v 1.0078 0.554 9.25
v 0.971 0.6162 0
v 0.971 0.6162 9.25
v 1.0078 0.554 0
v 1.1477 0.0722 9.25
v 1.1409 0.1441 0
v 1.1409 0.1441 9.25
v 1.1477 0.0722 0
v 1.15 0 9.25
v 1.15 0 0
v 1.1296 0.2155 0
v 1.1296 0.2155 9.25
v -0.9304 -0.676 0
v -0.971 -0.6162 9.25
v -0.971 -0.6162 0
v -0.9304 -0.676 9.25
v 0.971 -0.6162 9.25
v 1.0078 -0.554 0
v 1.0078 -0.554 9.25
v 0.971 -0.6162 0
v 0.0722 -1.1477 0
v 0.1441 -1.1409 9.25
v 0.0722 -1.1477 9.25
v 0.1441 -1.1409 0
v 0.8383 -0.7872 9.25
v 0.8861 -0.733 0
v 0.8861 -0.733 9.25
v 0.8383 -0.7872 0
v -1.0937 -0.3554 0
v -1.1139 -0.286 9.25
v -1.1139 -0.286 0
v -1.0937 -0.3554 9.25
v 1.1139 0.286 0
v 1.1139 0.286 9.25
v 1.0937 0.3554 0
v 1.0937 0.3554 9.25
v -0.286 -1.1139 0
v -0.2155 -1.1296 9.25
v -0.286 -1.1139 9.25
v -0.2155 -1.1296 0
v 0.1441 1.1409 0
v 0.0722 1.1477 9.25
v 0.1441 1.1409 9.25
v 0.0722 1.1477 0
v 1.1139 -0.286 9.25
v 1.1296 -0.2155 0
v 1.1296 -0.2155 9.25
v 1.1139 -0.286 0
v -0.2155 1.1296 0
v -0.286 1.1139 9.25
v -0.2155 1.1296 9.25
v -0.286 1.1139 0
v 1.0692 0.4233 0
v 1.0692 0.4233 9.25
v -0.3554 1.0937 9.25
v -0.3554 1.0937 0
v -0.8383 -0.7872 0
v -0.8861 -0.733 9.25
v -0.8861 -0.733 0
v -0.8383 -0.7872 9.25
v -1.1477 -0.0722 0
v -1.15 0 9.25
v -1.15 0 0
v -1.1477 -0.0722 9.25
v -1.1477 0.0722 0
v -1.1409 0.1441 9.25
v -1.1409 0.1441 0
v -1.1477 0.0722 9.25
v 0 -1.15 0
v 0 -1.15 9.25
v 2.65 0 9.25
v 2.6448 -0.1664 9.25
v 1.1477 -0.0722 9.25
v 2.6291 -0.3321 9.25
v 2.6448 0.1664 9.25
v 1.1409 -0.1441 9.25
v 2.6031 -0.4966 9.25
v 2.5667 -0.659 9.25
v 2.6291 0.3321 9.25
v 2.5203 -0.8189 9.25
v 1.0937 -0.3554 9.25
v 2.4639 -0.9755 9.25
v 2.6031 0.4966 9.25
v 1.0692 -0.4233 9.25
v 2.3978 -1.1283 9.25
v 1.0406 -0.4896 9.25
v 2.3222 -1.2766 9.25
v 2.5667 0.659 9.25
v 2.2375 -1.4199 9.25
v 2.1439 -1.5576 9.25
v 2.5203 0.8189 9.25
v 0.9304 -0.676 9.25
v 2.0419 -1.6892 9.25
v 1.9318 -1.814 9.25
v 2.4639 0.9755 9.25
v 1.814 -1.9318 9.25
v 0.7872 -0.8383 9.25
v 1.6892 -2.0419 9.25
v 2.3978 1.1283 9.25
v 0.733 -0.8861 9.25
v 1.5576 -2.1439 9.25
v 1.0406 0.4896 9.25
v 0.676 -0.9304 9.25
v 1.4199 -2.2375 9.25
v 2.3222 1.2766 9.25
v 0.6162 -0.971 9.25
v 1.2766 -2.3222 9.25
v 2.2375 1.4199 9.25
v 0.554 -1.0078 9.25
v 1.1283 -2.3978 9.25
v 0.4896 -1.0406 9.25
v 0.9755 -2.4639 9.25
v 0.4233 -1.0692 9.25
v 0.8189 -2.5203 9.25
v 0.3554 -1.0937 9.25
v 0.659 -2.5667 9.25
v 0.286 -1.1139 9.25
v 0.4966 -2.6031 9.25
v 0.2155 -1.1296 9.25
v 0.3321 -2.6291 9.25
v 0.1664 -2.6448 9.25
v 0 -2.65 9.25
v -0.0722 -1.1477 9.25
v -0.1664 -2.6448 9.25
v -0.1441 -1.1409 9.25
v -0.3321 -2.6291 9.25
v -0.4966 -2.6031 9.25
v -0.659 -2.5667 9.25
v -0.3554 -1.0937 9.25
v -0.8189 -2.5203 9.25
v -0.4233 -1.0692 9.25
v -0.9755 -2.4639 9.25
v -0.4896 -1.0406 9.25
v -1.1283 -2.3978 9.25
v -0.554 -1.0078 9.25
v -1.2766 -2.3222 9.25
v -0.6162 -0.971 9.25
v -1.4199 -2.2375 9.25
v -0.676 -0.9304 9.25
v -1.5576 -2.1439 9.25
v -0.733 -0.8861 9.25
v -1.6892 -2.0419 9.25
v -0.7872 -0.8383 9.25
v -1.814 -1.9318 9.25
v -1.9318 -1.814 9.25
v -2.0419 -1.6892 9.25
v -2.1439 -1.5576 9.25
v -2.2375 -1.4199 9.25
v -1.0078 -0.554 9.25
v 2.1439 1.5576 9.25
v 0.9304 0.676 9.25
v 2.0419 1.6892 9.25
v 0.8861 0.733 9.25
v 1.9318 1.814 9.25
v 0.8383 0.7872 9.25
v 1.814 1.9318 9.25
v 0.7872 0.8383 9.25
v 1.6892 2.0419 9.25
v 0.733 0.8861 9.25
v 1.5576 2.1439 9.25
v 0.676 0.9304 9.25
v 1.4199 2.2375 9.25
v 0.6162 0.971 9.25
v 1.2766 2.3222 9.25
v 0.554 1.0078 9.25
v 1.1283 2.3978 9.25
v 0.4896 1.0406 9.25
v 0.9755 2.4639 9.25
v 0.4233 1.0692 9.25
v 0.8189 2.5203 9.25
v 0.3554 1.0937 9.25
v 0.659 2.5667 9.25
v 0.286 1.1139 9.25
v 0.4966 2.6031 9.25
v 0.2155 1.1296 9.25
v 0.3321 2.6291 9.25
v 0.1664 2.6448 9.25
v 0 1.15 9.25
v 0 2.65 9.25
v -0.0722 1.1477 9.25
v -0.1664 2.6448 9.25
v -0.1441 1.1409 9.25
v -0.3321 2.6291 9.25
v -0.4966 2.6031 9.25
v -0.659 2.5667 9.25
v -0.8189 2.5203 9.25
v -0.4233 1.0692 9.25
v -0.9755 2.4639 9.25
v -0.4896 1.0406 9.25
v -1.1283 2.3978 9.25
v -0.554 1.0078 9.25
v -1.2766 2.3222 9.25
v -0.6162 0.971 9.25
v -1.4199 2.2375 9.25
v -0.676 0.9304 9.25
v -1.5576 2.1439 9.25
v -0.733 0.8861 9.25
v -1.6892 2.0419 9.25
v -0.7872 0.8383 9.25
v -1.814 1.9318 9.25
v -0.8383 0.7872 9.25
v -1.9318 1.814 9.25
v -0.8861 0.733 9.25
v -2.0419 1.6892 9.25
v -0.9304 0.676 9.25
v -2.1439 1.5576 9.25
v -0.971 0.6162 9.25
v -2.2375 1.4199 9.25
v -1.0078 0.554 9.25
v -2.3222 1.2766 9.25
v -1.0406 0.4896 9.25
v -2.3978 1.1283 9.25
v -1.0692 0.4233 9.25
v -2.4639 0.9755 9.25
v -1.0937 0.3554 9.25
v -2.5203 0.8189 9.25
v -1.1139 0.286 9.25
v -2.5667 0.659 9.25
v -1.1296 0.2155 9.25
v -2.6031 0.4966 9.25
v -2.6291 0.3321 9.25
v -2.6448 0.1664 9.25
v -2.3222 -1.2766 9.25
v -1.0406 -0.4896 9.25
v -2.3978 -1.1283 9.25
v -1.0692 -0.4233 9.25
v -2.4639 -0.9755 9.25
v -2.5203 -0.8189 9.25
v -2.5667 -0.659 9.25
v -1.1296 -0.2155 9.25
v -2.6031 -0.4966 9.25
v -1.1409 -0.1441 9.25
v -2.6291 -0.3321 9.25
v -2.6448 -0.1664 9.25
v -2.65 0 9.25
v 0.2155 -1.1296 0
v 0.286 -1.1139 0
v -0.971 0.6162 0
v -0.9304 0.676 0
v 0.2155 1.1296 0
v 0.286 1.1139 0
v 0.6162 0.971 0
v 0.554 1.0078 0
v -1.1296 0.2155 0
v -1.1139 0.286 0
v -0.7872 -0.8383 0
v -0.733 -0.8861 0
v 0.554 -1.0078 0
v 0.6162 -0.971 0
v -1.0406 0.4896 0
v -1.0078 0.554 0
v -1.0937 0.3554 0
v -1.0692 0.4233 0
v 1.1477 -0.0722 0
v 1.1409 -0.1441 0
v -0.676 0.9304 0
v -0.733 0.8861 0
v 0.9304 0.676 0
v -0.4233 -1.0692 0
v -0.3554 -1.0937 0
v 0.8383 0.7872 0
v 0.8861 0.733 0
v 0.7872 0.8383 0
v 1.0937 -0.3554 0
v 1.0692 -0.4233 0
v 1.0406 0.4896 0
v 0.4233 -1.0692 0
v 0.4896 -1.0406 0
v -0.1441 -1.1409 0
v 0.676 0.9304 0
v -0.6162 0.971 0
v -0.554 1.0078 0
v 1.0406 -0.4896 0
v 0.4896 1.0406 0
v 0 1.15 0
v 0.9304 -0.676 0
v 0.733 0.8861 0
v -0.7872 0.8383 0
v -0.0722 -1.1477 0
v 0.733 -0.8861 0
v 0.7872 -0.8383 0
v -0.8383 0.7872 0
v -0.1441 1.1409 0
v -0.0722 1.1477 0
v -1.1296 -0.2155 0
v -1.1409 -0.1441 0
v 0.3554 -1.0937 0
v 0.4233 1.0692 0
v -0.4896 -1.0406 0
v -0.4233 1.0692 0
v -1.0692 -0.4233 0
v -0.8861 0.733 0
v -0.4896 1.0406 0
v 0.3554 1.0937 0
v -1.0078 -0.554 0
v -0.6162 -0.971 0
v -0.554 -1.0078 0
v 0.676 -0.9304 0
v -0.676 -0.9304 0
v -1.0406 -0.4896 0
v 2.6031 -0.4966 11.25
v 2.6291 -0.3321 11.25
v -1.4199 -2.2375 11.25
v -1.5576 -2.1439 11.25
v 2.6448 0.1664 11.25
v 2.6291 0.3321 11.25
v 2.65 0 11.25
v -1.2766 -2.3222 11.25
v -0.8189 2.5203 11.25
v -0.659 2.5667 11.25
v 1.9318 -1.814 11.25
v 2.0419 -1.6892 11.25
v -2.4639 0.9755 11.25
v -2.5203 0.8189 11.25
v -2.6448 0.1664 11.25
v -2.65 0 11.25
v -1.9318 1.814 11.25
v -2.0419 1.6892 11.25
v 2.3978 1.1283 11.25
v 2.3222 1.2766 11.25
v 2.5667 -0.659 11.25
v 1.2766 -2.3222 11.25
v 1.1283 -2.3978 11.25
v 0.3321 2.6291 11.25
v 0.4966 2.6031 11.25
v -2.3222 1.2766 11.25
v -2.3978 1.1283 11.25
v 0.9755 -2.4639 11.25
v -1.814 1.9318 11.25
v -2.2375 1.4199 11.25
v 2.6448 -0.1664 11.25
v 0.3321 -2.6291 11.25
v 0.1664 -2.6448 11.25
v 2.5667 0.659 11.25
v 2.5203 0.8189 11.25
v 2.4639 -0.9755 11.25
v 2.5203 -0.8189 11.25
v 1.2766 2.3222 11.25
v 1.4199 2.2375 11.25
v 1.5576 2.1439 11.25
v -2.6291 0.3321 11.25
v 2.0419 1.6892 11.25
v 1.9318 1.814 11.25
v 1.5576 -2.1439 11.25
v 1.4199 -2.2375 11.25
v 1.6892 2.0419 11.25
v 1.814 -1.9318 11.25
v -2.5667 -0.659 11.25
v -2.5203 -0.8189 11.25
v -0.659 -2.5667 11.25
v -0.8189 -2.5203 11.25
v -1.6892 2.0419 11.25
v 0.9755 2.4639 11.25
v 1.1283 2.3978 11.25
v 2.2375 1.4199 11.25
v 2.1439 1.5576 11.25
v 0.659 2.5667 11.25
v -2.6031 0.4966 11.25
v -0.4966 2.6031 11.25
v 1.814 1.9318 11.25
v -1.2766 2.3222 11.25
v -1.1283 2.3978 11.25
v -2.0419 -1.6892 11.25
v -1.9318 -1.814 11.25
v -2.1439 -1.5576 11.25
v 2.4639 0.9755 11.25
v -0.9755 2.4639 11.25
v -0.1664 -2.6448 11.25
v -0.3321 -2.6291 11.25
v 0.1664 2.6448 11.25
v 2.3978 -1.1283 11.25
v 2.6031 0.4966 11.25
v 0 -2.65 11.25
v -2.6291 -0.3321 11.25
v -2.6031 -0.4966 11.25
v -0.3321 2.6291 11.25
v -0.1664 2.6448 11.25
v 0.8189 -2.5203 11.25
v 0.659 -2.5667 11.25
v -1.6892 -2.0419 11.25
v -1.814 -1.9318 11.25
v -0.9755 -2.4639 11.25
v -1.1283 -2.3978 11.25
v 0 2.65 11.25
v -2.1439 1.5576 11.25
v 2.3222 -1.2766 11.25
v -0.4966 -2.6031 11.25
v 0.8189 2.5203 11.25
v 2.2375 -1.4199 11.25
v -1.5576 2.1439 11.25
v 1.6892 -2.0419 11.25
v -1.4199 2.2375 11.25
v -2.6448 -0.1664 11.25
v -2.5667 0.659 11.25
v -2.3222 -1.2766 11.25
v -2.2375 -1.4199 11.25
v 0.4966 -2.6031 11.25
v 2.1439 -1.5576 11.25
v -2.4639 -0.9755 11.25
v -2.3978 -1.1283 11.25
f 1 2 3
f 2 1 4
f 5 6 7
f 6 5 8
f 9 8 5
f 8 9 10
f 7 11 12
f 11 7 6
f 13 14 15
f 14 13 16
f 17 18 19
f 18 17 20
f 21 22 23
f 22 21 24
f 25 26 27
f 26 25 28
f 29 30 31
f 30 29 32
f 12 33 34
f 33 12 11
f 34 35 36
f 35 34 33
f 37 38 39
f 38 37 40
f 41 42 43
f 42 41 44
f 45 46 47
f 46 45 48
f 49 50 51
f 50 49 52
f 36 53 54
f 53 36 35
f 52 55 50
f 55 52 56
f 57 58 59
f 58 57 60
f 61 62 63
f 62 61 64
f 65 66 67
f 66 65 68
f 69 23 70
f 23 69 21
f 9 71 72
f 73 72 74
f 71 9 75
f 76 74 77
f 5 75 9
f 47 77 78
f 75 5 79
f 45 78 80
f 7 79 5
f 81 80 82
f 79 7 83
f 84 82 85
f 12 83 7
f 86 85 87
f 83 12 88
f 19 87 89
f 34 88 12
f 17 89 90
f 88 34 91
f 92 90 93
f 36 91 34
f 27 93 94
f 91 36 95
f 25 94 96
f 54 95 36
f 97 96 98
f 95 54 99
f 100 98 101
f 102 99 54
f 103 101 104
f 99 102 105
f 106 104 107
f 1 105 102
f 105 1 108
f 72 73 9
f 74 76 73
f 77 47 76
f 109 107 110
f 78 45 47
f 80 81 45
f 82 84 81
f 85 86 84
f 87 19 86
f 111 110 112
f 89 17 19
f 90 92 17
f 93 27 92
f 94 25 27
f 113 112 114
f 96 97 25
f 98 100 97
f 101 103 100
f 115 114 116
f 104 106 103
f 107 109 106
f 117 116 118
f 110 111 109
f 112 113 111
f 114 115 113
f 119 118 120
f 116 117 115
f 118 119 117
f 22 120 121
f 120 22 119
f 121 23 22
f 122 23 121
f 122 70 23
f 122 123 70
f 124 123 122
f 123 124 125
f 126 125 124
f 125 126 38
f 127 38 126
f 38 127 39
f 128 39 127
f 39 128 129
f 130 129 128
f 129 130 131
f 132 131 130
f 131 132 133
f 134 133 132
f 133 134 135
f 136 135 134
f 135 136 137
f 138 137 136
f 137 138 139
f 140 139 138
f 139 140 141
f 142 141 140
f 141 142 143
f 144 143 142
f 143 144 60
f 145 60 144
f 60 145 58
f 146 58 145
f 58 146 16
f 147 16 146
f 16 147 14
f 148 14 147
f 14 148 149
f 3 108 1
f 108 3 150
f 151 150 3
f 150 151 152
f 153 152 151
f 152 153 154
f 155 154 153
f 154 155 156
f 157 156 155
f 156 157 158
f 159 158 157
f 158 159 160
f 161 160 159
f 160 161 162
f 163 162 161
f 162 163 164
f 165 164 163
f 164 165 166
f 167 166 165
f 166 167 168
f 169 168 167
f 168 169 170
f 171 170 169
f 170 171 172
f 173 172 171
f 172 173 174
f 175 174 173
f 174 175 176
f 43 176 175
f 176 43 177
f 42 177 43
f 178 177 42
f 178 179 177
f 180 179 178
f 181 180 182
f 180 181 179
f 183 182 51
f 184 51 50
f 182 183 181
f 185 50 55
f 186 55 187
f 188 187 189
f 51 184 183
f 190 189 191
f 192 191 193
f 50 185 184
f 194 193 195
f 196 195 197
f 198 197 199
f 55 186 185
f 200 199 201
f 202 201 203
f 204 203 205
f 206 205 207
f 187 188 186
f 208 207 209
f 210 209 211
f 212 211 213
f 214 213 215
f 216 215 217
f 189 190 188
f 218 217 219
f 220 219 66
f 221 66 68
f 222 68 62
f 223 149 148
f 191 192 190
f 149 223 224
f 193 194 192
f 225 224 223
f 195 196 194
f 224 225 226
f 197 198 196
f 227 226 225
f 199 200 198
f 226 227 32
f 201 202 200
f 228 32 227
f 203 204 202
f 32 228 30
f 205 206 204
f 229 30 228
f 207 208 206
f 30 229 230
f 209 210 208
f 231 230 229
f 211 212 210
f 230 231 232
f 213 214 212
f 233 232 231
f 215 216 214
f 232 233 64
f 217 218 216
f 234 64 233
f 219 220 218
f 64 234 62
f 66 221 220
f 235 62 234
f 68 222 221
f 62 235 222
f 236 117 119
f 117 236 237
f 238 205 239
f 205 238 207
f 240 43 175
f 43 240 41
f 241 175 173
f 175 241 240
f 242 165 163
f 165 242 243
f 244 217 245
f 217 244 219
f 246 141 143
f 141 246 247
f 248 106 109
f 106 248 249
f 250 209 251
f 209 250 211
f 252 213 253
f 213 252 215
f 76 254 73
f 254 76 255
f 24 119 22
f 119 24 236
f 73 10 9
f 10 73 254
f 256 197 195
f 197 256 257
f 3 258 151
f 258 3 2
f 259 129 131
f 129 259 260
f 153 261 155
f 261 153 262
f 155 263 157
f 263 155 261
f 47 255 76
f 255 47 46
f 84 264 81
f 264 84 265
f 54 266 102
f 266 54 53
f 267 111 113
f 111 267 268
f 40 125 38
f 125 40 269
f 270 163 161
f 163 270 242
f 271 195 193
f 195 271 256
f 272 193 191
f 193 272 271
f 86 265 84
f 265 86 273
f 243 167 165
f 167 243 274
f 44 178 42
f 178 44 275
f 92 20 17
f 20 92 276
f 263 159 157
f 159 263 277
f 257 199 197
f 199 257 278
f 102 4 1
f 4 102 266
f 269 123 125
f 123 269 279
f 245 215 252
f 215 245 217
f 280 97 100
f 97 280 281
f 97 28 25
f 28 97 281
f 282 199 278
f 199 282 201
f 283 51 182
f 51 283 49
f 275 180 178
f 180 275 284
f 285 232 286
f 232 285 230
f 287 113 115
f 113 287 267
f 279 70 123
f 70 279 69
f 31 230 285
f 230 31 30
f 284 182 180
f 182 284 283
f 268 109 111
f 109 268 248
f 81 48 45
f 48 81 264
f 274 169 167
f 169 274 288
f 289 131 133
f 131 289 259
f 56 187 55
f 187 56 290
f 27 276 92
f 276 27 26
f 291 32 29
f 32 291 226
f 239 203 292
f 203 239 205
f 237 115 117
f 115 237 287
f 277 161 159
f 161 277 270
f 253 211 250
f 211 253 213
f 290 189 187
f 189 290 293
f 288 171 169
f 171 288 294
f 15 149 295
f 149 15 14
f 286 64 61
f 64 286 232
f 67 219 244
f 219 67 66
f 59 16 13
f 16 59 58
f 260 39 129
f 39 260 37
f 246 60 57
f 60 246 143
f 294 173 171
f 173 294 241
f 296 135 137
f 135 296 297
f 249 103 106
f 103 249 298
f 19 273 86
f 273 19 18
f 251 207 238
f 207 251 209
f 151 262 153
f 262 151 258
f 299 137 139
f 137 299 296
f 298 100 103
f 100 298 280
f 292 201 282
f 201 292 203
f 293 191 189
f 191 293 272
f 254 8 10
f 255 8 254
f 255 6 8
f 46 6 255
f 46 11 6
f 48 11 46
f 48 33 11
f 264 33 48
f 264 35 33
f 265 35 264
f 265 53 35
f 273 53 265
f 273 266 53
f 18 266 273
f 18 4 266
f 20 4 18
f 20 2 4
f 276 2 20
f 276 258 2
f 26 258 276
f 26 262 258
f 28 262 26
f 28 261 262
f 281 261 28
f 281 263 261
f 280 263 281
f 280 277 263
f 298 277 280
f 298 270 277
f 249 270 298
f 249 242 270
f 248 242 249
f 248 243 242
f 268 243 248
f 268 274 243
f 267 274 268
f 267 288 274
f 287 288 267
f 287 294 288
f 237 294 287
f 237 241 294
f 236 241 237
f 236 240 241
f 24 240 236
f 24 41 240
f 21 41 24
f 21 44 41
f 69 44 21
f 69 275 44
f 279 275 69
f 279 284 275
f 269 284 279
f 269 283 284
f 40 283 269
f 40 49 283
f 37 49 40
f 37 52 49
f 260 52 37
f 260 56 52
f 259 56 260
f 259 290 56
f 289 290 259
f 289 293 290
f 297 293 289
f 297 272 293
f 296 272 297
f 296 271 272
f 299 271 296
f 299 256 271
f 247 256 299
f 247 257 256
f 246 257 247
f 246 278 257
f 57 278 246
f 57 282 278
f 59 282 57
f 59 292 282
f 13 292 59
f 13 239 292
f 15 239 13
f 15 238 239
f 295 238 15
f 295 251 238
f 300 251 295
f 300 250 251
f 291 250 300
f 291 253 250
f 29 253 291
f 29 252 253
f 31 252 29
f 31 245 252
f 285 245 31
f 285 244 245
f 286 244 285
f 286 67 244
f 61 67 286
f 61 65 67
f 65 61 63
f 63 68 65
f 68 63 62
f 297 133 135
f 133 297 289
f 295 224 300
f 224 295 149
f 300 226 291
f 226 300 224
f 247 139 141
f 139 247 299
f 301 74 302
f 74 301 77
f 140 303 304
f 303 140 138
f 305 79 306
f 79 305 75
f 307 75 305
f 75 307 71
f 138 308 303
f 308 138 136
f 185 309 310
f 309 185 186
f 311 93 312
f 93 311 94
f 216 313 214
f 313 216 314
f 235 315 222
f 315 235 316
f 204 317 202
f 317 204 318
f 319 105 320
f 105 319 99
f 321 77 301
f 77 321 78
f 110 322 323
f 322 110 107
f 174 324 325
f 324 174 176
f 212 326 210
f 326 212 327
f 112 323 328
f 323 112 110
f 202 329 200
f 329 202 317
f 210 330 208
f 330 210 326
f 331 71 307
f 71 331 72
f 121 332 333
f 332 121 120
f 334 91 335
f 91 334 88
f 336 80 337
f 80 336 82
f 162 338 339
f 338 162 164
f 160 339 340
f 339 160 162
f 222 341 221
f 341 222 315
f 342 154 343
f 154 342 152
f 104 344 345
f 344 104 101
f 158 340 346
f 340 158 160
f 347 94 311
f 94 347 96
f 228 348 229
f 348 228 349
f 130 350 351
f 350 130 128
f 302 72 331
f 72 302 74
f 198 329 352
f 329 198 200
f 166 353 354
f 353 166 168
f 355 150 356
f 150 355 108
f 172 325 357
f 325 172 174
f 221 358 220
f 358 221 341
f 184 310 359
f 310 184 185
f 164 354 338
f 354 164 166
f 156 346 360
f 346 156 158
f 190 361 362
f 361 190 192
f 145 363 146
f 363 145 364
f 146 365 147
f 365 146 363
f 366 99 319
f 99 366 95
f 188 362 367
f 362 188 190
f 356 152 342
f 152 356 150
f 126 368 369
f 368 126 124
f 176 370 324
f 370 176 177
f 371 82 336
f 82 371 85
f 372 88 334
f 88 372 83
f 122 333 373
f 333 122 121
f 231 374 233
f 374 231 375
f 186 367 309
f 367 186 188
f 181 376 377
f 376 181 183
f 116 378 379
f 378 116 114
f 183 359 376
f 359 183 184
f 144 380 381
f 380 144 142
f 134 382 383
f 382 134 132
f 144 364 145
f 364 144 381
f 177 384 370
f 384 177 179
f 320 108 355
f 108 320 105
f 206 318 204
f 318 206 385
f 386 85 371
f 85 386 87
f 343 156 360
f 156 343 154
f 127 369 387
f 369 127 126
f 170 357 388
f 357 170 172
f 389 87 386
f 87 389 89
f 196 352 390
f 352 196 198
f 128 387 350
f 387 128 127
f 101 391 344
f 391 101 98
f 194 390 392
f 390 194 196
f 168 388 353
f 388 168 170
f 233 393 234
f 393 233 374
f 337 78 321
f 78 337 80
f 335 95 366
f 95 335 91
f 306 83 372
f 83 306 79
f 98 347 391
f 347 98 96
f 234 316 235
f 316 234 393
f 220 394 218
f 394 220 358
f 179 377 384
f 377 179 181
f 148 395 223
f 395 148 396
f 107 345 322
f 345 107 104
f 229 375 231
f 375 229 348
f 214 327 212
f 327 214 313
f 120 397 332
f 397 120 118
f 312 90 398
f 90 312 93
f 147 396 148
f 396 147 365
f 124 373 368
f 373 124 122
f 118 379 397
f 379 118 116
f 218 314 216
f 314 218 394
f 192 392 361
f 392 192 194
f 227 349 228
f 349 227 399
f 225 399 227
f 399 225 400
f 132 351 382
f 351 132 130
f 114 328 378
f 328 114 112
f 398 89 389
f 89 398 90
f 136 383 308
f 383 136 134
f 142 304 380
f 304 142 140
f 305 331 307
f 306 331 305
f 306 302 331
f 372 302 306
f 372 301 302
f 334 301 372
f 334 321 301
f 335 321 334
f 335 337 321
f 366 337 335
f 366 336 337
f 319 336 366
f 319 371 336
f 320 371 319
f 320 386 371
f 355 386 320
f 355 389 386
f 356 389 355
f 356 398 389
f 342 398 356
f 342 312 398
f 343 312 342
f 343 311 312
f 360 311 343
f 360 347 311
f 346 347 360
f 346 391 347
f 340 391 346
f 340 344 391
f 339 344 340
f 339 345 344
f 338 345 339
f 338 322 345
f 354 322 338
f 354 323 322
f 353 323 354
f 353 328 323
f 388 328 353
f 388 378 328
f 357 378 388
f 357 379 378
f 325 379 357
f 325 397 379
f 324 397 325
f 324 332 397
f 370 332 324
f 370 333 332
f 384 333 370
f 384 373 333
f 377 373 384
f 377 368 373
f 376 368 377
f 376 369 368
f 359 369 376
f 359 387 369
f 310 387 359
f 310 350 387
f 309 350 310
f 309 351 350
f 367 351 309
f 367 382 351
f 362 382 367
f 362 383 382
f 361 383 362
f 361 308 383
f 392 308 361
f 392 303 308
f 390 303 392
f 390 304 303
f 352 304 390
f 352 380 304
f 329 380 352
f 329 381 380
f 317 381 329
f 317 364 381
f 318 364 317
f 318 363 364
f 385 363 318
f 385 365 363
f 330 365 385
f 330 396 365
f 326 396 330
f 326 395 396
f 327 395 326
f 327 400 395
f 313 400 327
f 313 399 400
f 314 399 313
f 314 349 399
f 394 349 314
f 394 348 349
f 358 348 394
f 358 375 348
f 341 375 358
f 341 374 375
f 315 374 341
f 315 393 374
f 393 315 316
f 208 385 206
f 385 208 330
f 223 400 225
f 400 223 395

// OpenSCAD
//this is the small servo motor screw.
$fn=100;

headdiam=5.3;
headheight=2;
threaddiam=2.7;
threadheight=9.25;

module MotorScrew(3dPrinterTolerance){
	union(){
		cylinder(r=threaddiam/2-3dPrinterTolerance/2, h=threadheight);	//the threads
		translate([0,0,threadheight]){
			cylinder(r=headdiam/2, h=headheight);	//the head
		}
	}
}

MotorScrew(.4);
